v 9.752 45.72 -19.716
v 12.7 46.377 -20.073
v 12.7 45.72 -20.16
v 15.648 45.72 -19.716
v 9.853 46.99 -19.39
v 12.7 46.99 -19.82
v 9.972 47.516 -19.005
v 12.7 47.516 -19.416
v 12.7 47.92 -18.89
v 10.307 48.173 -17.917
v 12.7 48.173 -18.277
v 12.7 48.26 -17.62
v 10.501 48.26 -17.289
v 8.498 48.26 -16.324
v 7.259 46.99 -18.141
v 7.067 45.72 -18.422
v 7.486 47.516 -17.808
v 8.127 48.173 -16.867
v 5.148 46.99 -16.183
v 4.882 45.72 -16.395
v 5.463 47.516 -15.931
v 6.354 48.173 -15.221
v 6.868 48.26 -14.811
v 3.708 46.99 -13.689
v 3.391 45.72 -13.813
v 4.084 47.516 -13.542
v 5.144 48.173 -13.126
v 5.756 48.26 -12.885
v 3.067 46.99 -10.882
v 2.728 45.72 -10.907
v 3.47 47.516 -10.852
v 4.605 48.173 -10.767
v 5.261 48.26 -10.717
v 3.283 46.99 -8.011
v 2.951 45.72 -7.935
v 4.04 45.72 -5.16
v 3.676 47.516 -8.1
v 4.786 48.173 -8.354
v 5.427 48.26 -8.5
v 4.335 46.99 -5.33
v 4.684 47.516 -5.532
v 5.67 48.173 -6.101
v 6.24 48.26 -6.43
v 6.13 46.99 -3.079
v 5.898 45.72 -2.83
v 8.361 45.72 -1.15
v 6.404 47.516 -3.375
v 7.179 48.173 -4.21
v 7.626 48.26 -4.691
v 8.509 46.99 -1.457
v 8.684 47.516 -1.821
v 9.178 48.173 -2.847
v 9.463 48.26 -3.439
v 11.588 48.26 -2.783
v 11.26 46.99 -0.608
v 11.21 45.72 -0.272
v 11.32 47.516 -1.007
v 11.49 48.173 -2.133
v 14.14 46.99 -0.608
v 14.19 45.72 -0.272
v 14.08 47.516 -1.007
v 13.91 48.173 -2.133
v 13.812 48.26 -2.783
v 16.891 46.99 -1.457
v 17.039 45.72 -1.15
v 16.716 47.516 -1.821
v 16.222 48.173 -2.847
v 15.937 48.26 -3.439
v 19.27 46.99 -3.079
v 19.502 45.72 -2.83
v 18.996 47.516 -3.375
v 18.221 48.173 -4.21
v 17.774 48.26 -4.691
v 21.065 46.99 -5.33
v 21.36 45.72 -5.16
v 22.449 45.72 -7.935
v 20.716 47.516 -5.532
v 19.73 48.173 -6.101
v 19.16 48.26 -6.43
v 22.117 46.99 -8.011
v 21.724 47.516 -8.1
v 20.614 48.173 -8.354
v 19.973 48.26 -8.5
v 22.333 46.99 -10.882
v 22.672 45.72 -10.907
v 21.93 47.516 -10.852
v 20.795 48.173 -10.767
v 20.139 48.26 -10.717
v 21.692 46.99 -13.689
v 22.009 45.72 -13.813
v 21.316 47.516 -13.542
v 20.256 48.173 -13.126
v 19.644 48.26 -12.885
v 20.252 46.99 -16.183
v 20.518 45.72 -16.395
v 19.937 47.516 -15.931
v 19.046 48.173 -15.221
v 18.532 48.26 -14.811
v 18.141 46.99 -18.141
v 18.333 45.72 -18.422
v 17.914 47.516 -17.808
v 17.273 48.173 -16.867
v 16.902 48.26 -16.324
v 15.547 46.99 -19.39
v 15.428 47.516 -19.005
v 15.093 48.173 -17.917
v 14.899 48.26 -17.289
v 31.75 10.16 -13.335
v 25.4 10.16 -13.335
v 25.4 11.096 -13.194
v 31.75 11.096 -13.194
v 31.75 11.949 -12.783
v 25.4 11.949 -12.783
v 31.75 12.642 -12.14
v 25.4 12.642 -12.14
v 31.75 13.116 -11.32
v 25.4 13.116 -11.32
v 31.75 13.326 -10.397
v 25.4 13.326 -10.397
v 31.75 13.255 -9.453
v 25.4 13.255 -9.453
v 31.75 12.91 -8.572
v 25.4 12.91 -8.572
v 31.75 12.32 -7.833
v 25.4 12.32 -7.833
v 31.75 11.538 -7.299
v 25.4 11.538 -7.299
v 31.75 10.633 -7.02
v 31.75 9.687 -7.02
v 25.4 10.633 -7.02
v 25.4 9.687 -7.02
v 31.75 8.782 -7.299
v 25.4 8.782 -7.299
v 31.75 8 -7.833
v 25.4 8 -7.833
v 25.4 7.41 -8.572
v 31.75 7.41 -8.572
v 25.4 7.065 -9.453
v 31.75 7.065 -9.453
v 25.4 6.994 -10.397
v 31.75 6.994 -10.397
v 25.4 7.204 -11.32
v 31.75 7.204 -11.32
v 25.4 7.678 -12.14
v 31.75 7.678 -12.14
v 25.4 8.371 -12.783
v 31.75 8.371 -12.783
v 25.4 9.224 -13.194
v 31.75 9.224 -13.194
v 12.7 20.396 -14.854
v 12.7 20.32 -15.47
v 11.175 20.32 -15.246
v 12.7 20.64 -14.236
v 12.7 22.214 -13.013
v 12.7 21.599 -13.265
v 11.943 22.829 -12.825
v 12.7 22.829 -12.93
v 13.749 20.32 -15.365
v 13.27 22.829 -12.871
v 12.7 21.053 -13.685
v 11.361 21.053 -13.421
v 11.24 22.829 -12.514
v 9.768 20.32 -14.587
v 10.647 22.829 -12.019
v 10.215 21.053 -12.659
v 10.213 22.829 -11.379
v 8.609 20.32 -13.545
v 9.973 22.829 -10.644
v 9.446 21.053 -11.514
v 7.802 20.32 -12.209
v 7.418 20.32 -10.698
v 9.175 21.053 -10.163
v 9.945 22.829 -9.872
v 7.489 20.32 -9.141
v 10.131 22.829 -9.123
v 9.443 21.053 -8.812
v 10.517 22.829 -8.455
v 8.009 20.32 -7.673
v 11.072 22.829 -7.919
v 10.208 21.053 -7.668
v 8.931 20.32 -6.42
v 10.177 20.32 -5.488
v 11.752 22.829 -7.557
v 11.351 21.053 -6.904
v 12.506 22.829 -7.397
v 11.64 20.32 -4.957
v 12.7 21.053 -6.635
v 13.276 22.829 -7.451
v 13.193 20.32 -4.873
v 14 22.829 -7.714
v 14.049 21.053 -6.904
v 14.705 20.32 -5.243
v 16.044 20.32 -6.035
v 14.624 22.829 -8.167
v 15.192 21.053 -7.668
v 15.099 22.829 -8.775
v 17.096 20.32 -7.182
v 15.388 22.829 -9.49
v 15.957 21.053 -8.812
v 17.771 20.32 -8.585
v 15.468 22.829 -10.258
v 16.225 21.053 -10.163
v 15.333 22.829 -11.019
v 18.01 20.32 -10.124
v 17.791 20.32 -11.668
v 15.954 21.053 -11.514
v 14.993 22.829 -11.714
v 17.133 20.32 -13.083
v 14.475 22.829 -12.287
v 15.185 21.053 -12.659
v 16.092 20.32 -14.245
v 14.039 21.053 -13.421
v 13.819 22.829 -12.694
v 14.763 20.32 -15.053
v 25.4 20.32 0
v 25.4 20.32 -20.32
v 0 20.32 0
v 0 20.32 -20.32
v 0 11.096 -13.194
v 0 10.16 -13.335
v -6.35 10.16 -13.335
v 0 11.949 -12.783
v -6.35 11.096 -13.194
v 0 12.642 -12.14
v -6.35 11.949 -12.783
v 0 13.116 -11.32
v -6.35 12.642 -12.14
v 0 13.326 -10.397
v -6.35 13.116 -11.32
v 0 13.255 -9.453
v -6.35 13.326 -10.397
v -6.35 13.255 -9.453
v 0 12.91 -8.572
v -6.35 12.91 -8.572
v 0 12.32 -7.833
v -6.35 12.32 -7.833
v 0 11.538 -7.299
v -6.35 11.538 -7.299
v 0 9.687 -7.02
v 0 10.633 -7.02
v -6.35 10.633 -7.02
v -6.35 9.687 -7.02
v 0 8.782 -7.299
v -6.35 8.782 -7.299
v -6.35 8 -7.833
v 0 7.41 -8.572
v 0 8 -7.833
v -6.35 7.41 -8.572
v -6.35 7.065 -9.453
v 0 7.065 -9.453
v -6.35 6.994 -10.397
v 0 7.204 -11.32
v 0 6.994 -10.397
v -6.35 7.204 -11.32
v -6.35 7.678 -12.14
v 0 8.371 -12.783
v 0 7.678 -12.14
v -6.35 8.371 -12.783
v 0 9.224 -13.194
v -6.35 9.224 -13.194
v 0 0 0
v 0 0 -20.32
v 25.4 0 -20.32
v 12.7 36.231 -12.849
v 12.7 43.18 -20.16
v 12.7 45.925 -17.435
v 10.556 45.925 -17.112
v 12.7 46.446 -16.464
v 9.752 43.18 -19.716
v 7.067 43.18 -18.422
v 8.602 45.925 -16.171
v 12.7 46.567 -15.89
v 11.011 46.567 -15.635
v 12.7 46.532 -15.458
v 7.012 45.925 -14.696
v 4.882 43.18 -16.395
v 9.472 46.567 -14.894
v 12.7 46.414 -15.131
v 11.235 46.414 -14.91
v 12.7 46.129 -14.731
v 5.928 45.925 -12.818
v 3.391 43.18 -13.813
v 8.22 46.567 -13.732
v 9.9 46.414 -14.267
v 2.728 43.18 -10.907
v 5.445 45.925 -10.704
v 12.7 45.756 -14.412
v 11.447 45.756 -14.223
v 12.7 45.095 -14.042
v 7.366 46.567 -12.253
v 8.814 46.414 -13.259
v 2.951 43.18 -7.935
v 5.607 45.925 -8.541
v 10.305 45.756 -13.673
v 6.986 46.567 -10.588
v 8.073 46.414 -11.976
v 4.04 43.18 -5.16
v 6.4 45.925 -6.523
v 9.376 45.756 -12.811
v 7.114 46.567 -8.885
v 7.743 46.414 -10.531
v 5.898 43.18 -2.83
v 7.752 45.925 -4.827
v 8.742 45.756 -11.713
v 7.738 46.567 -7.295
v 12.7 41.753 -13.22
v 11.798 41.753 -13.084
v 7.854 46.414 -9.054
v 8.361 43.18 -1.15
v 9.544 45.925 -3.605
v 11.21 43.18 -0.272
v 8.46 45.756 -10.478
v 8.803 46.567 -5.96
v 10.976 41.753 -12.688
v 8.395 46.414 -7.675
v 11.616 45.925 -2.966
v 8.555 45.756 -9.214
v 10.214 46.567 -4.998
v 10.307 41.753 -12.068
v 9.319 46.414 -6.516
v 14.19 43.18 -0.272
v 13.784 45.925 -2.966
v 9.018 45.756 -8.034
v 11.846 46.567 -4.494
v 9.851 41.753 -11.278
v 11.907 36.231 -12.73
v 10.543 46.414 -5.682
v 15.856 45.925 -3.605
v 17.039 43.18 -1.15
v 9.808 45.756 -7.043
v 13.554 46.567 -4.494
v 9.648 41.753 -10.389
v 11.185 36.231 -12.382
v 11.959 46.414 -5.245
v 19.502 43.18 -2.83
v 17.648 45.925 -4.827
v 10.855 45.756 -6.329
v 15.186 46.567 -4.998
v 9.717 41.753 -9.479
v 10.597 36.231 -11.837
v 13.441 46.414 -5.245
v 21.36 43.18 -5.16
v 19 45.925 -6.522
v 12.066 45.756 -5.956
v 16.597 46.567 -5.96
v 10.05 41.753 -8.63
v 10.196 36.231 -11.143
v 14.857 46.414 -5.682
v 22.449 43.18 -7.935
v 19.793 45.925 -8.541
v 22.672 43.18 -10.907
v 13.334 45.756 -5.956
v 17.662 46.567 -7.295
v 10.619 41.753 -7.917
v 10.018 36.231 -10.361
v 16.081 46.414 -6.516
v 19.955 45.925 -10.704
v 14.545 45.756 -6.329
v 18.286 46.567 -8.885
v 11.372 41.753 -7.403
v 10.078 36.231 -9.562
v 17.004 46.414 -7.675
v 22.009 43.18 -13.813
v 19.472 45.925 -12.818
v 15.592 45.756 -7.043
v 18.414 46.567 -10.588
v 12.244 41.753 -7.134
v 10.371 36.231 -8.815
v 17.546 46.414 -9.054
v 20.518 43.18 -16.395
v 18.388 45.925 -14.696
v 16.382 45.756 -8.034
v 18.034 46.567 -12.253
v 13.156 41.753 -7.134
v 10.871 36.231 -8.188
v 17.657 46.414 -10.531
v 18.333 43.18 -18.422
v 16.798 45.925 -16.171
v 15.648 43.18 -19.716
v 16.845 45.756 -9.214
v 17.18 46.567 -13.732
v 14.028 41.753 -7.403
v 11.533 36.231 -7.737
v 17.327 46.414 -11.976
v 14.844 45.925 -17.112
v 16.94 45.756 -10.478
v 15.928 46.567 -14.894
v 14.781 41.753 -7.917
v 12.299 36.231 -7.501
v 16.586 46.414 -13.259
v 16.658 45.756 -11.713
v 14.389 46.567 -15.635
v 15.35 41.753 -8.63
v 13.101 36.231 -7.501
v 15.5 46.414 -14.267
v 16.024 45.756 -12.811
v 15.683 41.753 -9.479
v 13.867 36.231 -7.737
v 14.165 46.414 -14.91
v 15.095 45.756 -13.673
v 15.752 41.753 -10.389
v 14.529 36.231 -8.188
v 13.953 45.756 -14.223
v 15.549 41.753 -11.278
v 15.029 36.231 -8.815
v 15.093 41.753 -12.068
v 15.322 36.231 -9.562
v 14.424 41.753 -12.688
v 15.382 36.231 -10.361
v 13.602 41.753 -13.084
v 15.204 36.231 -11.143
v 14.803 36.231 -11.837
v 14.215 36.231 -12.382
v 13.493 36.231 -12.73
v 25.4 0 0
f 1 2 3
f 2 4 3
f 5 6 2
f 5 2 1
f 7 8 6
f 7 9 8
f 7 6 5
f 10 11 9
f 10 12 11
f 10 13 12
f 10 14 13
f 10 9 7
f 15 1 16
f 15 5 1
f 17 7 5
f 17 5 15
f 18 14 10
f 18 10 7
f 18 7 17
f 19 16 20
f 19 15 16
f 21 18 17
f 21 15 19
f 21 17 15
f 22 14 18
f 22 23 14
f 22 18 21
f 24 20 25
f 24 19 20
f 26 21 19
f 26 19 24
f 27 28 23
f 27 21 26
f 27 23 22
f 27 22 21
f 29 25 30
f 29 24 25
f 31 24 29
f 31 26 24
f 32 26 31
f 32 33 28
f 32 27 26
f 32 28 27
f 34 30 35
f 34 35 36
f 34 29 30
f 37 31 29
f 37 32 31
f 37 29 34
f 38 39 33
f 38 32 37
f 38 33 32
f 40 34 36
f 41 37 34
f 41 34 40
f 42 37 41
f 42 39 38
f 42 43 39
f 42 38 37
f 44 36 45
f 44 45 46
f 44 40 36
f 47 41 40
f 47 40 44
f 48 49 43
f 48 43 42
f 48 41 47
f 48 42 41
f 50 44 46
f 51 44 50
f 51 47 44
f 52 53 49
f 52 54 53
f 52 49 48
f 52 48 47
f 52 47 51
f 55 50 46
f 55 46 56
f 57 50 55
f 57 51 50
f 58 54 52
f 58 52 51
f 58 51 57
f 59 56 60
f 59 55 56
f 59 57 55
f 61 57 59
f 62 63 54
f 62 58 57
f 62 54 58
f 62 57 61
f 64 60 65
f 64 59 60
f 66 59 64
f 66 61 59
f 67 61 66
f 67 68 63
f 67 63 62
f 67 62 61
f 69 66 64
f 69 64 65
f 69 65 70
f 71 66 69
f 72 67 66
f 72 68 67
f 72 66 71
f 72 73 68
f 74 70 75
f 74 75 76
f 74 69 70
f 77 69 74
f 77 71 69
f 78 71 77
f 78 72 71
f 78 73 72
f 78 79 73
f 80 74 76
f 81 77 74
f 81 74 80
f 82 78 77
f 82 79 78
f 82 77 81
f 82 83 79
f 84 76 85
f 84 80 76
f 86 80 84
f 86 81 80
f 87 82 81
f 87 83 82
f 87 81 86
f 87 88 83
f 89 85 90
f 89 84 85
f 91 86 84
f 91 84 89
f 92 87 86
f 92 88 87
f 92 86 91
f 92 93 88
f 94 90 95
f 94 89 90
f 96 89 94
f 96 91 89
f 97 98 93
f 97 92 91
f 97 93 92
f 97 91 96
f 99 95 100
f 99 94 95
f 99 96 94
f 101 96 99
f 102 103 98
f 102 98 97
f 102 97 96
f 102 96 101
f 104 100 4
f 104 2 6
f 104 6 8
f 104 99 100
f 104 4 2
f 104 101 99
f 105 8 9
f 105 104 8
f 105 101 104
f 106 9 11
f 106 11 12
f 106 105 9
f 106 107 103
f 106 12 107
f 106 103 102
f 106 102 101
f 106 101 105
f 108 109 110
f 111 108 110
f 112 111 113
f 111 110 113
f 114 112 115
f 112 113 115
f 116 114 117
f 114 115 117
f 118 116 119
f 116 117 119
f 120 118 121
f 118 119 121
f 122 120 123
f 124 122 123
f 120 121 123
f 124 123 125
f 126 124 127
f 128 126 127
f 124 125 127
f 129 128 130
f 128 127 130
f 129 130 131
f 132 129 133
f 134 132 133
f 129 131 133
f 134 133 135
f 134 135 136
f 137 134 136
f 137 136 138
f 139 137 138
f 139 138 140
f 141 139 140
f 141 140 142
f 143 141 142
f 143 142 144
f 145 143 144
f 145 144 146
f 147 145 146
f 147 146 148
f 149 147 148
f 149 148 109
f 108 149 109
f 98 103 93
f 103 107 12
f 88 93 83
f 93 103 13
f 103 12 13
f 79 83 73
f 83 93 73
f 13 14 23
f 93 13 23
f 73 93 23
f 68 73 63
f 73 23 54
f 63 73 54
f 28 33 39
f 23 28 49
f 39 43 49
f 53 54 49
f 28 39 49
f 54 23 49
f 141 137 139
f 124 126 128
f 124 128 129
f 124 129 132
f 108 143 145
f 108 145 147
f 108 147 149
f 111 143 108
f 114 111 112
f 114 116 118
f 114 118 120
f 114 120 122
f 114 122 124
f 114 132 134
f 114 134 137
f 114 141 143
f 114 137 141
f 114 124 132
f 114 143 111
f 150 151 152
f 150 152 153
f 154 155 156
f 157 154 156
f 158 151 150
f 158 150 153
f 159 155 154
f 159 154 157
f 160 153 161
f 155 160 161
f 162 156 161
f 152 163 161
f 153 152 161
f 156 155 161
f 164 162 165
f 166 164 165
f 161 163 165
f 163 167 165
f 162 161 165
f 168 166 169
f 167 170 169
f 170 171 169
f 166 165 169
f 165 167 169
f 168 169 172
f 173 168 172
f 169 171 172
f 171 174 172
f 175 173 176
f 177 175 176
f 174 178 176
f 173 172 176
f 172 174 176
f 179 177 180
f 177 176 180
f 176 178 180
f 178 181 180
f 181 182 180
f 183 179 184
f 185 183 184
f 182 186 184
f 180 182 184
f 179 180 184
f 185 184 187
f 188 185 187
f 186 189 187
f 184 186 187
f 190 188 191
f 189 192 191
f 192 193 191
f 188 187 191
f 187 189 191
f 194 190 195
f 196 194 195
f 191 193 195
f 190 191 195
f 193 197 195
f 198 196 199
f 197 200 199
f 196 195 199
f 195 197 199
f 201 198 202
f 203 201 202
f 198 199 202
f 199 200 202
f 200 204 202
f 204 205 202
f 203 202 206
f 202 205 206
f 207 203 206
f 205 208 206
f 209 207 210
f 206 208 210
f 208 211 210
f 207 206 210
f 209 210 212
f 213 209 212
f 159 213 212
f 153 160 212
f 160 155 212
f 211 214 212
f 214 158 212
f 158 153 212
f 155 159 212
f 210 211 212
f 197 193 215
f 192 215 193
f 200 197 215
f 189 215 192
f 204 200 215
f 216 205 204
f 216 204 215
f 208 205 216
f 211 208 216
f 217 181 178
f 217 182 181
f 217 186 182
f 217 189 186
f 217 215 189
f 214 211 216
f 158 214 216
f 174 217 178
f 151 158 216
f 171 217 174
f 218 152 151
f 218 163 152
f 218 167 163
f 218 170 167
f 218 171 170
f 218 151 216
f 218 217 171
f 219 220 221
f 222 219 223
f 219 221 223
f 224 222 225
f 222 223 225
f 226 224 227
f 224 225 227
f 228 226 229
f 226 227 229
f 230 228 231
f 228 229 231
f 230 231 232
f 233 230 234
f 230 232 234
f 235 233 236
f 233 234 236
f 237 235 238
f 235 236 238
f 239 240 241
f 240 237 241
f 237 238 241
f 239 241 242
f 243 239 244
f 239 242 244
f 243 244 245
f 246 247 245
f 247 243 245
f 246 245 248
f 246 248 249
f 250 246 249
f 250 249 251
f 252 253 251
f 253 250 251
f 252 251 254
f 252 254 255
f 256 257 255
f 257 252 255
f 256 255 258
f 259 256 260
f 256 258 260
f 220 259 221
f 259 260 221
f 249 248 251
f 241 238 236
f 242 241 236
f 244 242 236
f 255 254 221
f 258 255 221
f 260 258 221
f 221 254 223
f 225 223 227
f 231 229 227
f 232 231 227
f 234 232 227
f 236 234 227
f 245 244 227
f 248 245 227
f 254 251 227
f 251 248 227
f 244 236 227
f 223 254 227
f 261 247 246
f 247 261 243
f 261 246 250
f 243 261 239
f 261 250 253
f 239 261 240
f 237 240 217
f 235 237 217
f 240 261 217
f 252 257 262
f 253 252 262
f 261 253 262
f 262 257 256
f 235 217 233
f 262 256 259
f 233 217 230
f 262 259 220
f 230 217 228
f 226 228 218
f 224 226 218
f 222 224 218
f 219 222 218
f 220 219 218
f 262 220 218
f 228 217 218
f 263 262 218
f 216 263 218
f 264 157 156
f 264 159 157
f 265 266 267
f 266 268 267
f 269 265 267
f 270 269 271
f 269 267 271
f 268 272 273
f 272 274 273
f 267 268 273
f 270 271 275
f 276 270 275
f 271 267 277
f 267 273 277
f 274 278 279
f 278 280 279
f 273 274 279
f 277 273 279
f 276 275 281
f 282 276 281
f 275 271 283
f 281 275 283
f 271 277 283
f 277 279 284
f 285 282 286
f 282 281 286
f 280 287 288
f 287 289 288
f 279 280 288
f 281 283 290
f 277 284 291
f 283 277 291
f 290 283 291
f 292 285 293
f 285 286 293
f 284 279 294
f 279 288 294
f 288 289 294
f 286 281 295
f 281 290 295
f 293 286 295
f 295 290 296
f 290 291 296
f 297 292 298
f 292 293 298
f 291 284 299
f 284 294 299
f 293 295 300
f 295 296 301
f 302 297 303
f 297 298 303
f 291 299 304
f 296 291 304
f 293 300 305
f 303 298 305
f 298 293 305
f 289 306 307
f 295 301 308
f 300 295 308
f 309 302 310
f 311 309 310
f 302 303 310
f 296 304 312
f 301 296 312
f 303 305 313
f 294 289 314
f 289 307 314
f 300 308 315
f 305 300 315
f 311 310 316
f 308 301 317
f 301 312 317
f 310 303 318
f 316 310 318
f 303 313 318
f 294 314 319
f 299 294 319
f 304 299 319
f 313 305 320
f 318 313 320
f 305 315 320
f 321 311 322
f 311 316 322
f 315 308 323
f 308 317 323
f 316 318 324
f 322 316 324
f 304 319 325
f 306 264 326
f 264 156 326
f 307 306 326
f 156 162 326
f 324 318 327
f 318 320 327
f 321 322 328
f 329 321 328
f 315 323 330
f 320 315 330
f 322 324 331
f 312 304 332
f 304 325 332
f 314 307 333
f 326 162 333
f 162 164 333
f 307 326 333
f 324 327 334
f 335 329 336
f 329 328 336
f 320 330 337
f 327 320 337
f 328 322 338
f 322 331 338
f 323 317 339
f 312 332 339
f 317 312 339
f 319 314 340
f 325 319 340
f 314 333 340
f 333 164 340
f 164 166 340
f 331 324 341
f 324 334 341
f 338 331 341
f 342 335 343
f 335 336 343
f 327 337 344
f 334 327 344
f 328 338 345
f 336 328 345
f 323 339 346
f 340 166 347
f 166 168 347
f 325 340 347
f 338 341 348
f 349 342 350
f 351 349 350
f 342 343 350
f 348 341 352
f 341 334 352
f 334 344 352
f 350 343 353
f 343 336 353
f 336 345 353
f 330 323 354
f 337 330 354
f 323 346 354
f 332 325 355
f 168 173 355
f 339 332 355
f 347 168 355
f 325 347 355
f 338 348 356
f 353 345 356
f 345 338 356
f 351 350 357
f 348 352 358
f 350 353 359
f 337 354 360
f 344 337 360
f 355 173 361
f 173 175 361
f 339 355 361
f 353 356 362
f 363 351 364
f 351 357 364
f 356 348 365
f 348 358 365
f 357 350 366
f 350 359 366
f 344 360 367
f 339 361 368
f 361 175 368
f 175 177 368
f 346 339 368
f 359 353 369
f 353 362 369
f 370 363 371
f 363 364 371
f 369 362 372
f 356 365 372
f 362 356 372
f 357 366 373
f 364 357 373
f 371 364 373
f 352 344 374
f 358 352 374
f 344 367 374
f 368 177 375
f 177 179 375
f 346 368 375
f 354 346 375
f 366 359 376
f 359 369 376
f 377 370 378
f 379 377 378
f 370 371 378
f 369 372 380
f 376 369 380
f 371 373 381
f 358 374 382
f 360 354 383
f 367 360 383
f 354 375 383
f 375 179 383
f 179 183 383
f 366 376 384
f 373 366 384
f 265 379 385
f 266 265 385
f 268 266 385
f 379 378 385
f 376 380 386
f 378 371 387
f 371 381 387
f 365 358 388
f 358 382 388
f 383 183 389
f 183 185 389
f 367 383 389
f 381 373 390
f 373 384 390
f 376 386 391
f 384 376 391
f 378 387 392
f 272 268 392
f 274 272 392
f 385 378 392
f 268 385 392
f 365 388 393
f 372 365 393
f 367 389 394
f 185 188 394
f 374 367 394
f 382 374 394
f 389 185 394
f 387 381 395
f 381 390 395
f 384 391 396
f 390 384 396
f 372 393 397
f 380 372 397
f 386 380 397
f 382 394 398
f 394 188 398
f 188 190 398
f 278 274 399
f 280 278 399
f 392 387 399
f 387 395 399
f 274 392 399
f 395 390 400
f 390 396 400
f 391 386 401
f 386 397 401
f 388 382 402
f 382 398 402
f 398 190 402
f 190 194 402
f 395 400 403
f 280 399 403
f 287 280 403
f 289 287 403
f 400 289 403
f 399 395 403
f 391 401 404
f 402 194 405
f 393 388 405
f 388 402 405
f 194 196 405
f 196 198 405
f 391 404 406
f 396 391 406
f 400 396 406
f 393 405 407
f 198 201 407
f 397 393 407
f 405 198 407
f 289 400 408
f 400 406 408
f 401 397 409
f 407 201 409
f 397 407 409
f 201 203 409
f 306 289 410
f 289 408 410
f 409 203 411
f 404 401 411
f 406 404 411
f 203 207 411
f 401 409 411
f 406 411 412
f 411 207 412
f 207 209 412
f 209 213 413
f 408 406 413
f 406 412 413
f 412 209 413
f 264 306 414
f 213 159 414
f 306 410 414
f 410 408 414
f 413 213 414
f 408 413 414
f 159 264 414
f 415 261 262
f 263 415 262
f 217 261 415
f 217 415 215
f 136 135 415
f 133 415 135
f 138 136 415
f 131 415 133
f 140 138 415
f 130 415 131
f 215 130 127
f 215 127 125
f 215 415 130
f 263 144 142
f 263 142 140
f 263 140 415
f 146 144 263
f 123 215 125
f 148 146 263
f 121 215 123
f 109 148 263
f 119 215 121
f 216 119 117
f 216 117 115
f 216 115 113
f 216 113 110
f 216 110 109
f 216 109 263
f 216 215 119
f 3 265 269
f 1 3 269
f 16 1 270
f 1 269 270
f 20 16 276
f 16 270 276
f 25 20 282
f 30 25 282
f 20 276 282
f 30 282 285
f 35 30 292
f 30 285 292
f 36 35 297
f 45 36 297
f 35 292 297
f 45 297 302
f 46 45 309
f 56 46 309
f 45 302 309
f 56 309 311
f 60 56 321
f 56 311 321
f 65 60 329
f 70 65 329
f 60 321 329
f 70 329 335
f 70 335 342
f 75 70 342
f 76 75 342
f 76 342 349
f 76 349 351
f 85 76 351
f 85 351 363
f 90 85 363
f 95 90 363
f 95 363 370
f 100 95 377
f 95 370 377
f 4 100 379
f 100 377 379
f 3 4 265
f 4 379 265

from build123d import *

# Parameters (mm, degrees)
SKETCH2_W          = 20.32
SKETCH2_H          = 20.32
CENTRAL_BOX_DEPTH  = 25.4
NIBBLES_DEPTH      = 6.35
NIBBLES_DEPTH_BACK = 31.75
SKETCH4_R          = 3.175
YAY_ROUNDED_R      = 2.54


with BuildPart() as part:
    # Sketch2 → central box (new body)
    with BuildSketch(Plane(origin=(0, 0, 0), x_dir=(0, 0, -1), z_dir=(1, 0, 0))):
        with Locations((10.16, 10.16)):
            Rectangle(SKETCH2_W, SKETCH2_H)
    extrude(amount=CENTRAL_BOX_DEPTH)

    # Sketch4 → nibbles (add, two sides: drawn at the far end of the back side and taken through both)
    with BuildSketch(Plane(origin=(25.4, 0, 0), x_dir=(0, 0, -1), z_dir=(1, 0, 0)).offset(-NIBBLES_DEPTH_BACK)):
        with Locations((10.16, 10.16)):
            Circle(SKETCH4_R)
    extrude(amount=NIBBLES_DEPTH + NIBBLES_DEPTH_BACK)

    # Sketch6 → stick (revolve)
    with BuildSketch(Plane.XY.offset(-10.16), mode=Mode.PRIVATE) as stick_sk:
        with BuildLine():
            Line((12.7, 20.32), (12.7, 48.26))
            Line((12.7, 48.26), (22.69993783, 48.26))
            Line((22.69993783, 48.26), (22.69993783, 43.18))
            add(Edge.make_bspline(
                [(22.69993783, 43.18), (14.011650276, 53.987913913), (15.389137078, 36.935795993), (15.494, 20.32)],
                knots=[0, 0, 0, 0, 1, 1, 1, 1], degree=3))
            Line((15.494, 20.32), (12.7, 20.32))
        make_face()
    revolve(stick_sk.sketch.rotate(Axis((12.7, 20.32, -10.16), (0, 1, 0)), 90), axis=Axis((12.7, 20.32, -10.16), (0, 1, 0)))

    # yay, rounded
    yay_rounded_edges = [part.edges().sort_by_distance(p)[0] for p in [
        (12.7, 20.32, -7.366),
        (12.7, 48.26, -0.16006217),
    ]]
    fillet(yay_rounded_edges, radius=YAY_ROUNDED_R)


solid = part.part
